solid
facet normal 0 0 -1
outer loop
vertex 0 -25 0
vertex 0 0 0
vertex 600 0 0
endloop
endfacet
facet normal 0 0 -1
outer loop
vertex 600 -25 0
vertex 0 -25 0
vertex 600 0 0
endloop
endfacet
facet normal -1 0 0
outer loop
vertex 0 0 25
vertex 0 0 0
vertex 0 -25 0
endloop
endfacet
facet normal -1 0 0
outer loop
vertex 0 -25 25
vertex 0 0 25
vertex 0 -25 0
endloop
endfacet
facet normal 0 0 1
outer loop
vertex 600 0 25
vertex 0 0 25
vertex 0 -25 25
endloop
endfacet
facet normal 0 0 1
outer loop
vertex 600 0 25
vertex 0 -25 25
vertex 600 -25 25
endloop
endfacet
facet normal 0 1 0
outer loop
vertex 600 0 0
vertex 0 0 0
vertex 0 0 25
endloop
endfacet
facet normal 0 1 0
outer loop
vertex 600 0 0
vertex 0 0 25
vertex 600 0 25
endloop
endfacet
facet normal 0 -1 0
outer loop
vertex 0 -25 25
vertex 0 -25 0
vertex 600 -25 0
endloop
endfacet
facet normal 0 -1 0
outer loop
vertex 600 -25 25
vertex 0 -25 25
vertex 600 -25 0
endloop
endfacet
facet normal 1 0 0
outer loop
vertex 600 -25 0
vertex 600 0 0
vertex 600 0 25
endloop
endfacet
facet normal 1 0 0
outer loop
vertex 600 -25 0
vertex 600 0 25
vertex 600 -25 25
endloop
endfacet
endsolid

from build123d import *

# Parameters (mm, degrees)
F0_W     = 43.3424860239
F0_H     = 30.723374337
F1_DEPTH = 600
F2_DEPTH = 25
F3_DEPTH = 25


with BuildPart() as f1:
    # F0 (on Right) → F1 (new body)
    with BuildSketch(Plane.YZ):
        with Locations((-21.671243012, 15.3616871685)):
            Rectangle(F0_W, F0_H)
    extrude(amount=F1_DEPTH)

    # F2 (intersect): a face of the model
    f2_faces = [f1.faces().sort_by_distance(p)[0] for p in [
        (300, 0, 15.3616871685),
    ]]
    extrude(f2_faces, amount=-F2_DEPTH, mode=Mode.INTERSECT)

    # F3 (intersect): a face of the model
    f3_faces = [f1.faces().sort_by_distance(p)[0] for p in [
        (300, -12.5, 0),
    ]]
    extrude(f3_faces, amount=-F3_DEPTH, mode=Mode.INTERSECT)


solid = f1.part
